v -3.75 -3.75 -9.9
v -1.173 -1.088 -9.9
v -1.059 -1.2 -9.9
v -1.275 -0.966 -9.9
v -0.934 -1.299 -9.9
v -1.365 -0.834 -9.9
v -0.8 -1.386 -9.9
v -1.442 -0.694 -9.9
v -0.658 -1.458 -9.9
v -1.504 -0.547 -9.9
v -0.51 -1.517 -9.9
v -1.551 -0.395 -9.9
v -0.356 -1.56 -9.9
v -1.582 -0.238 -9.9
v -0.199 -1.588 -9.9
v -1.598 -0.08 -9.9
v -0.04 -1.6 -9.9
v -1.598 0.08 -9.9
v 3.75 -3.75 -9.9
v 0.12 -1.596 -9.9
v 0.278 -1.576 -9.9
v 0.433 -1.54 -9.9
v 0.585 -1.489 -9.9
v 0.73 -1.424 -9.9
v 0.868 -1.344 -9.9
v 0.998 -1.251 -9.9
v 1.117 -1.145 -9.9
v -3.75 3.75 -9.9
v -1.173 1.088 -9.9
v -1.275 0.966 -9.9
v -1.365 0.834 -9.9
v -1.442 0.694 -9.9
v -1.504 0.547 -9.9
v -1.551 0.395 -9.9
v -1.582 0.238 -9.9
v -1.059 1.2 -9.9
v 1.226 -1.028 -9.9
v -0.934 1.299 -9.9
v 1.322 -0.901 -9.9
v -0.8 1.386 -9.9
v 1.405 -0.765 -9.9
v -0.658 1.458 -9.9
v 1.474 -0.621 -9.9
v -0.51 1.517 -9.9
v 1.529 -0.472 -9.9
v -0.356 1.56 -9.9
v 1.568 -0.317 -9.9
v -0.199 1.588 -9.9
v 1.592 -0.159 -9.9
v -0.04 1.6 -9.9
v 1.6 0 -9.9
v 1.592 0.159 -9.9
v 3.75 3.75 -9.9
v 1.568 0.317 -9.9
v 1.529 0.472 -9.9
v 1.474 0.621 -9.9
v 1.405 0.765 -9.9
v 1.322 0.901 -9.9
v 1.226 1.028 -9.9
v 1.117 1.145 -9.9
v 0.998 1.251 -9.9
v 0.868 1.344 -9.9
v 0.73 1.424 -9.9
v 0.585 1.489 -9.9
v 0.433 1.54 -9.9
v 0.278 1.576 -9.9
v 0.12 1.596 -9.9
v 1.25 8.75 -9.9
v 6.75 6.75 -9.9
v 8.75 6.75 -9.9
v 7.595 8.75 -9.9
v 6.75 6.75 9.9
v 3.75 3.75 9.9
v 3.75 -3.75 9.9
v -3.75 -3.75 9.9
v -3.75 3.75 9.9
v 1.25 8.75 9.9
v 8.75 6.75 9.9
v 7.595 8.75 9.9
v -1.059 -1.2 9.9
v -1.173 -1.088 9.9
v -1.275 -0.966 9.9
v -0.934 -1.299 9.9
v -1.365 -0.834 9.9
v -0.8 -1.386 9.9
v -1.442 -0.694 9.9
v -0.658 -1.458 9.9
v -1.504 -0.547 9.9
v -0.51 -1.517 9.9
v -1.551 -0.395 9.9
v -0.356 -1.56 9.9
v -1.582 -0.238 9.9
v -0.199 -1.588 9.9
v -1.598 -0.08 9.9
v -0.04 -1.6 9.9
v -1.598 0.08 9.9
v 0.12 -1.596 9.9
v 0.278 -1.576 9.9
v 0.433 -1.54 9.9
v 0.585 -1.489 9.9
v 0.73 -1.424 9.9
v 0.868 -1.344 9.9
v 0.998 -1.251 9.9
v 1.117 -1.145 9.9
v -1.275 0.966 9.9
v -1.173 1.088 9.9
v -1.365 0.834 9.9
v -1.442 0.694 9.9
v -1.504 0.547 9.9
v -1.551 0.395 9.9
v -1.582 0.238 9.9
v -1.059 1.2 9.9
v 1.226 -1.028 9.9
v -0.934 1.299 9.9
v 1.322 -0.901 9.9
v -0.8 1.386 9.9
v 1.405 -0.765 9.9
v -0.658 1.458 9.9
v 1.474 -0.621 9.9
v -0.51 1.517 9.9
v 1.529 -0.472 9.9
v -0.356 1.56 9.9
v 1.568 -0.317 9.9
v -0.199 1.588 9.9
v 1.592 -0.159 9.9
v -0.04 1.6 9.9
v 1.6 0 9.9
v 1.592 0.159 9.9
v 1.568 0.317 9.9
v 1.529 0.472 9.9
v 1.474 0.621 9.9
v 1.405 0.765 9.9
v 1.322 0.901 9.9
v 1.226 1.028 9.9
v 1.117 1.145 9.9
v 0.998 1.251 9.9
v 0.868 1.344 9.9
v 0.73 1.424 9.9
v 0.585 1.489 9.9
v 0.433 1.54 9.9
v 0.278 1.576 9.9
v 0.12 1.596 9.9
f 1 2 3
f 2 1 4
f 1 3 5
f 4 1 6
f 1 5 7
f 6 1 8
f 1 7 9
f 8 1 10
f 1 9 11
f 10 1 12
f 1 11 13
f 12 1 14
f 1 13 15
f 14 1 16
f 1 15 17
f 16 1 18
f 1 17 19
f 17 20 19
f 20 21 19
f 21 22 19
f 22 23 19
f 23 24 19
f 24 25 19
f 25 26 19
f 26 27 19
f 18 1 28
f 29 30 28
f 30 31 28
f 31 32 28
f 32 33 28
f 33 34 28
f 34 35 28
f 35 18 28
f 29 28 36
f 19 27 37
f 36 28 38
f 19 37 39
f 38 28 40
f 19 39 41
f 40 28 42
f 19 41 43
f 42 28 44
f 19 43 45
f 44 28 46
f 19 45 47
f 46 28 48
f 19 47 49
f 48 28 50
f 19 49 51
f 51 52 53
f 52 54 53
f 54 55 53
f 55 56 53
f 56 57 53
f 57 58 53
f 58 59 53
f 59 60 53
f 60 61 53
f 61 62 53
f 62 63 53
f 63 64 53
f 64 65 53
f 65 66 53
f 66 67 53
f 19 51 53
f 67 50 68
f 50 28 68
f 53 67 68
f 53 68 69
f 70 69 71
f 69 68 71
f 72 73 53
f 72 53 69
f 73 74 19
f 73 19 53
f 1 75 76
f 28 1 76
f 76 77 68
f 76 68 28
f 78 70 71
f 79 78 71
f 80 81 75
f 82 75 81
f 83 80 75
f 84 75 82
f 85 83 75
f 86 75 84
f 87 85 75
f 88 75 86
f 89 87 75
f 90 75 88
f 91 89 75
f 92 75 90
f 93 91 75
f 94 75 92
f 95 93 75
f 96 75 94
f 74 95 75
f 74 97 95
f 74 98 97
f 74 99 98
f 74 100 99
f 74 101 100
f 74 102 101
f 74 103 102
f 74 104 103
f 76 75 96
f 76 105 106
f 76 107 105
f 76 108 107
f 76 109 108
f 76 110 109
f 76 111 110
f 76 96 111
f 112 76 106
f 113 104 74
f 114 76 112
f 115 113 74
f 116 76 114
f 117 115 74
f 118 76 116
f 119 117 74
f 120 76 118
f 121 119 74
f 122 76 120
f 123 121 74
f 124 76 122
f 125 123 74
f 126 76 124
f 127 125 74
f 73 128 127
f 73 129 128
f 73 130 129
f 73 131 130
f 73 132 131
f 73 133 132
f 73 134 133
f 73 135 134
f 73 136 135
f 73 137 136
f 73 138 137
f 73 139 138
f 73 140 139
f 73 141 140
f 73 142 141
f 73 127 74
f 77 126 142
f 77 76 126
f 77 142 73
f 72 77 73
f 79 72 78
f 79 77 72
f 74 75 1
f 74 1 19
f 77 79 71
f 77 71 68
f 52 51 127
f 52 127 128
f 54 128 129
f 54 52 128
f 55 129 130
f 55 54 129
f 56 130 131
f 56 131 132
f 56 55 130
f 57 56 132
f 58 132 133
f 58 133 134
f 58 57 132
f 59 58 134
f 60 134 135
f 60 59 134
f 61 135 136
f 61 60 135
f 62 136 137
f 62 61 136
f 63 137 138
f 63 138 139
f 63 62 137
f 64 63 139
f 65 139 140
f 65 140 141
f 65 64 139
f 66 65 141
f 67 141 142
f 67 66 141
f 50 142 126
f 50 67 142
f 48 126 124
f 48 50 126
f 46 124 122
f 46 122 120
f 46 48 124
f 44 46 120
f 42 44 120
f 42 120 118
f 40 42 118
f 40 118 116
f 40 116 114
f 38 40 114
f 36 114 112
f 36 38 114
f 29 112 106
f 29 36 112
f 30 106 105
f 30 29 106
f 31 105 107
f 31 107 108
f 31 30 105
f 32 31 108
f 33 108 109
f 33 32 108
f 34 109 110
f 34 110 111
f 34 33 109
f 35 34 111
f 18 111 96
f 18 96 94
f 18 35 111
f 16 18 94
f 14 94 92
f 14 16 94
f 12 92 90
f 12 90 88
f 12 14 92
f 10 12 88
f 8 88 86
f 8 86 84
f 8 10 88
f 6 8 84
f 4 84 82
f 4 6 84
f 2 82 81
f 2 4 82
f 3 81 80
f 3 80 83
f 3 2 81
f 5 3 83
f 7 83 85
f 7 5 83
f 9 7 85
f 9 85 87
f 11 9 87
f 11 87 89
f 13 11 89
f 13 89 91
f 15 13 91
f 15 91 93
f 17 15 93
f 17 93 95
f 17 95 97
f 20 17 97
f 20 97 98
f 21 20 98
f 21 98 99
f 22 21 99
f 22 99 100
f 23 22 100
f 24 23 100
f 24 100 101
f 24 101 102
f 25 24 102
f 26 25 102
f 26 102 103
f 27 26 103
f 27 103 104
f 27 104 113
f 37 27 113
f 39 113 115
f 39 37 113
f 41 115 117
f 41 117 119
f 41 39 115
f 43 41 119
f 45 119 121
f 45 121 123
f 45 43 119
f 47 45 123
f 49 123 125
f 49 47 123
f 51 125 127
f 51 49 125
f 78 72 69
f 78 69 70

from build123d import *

# Parameters (mm, degrees)
BOSS_EXTRUDE1_DEPTH      = 9.9
BOSS_EXTRUDE1_DEPTH_BACK = 9.9
SKETCH1_W                = 7.5
SKETCH1_H                = 7.5
SKETCH1_R                = 1.6
BOSS_EXTRUDE2_DEPTH      = 19.8


with BuildPart() as part:
    # Sketch1 → Boss-Extrude1 (new, two sides: drawn at the far end of the back side and taken through both)
    with BuildSketch(Plane.XY.offset(-BOSS_EXTRUDE1_DEPTH_BACK)):
        Rectangle(SKETCH1_W, SKETCH1_H)
        Circle(SKETCH1_R, mode=Mode.SUBTRACT)
    extrude(amount=BOSS_EXTRUDE1_DEPTH + BOSS_EXTRUDE1_DEPTH_BACK)

    # Sketch2 → Boss-Extrude2 (add)
    with BuildSketch(Plane.XY.offset(9.9)):
        Polygon((3.75, 3.75), (6.75, 6.75), (8.75, 6.75), (7.595299462, 8.75), (1.25, 8.75), (-3.75, 3.75), align=None)
    extrude(amount=-BOSS_EXTRUDE2_DEPTH)


solid = part.part
